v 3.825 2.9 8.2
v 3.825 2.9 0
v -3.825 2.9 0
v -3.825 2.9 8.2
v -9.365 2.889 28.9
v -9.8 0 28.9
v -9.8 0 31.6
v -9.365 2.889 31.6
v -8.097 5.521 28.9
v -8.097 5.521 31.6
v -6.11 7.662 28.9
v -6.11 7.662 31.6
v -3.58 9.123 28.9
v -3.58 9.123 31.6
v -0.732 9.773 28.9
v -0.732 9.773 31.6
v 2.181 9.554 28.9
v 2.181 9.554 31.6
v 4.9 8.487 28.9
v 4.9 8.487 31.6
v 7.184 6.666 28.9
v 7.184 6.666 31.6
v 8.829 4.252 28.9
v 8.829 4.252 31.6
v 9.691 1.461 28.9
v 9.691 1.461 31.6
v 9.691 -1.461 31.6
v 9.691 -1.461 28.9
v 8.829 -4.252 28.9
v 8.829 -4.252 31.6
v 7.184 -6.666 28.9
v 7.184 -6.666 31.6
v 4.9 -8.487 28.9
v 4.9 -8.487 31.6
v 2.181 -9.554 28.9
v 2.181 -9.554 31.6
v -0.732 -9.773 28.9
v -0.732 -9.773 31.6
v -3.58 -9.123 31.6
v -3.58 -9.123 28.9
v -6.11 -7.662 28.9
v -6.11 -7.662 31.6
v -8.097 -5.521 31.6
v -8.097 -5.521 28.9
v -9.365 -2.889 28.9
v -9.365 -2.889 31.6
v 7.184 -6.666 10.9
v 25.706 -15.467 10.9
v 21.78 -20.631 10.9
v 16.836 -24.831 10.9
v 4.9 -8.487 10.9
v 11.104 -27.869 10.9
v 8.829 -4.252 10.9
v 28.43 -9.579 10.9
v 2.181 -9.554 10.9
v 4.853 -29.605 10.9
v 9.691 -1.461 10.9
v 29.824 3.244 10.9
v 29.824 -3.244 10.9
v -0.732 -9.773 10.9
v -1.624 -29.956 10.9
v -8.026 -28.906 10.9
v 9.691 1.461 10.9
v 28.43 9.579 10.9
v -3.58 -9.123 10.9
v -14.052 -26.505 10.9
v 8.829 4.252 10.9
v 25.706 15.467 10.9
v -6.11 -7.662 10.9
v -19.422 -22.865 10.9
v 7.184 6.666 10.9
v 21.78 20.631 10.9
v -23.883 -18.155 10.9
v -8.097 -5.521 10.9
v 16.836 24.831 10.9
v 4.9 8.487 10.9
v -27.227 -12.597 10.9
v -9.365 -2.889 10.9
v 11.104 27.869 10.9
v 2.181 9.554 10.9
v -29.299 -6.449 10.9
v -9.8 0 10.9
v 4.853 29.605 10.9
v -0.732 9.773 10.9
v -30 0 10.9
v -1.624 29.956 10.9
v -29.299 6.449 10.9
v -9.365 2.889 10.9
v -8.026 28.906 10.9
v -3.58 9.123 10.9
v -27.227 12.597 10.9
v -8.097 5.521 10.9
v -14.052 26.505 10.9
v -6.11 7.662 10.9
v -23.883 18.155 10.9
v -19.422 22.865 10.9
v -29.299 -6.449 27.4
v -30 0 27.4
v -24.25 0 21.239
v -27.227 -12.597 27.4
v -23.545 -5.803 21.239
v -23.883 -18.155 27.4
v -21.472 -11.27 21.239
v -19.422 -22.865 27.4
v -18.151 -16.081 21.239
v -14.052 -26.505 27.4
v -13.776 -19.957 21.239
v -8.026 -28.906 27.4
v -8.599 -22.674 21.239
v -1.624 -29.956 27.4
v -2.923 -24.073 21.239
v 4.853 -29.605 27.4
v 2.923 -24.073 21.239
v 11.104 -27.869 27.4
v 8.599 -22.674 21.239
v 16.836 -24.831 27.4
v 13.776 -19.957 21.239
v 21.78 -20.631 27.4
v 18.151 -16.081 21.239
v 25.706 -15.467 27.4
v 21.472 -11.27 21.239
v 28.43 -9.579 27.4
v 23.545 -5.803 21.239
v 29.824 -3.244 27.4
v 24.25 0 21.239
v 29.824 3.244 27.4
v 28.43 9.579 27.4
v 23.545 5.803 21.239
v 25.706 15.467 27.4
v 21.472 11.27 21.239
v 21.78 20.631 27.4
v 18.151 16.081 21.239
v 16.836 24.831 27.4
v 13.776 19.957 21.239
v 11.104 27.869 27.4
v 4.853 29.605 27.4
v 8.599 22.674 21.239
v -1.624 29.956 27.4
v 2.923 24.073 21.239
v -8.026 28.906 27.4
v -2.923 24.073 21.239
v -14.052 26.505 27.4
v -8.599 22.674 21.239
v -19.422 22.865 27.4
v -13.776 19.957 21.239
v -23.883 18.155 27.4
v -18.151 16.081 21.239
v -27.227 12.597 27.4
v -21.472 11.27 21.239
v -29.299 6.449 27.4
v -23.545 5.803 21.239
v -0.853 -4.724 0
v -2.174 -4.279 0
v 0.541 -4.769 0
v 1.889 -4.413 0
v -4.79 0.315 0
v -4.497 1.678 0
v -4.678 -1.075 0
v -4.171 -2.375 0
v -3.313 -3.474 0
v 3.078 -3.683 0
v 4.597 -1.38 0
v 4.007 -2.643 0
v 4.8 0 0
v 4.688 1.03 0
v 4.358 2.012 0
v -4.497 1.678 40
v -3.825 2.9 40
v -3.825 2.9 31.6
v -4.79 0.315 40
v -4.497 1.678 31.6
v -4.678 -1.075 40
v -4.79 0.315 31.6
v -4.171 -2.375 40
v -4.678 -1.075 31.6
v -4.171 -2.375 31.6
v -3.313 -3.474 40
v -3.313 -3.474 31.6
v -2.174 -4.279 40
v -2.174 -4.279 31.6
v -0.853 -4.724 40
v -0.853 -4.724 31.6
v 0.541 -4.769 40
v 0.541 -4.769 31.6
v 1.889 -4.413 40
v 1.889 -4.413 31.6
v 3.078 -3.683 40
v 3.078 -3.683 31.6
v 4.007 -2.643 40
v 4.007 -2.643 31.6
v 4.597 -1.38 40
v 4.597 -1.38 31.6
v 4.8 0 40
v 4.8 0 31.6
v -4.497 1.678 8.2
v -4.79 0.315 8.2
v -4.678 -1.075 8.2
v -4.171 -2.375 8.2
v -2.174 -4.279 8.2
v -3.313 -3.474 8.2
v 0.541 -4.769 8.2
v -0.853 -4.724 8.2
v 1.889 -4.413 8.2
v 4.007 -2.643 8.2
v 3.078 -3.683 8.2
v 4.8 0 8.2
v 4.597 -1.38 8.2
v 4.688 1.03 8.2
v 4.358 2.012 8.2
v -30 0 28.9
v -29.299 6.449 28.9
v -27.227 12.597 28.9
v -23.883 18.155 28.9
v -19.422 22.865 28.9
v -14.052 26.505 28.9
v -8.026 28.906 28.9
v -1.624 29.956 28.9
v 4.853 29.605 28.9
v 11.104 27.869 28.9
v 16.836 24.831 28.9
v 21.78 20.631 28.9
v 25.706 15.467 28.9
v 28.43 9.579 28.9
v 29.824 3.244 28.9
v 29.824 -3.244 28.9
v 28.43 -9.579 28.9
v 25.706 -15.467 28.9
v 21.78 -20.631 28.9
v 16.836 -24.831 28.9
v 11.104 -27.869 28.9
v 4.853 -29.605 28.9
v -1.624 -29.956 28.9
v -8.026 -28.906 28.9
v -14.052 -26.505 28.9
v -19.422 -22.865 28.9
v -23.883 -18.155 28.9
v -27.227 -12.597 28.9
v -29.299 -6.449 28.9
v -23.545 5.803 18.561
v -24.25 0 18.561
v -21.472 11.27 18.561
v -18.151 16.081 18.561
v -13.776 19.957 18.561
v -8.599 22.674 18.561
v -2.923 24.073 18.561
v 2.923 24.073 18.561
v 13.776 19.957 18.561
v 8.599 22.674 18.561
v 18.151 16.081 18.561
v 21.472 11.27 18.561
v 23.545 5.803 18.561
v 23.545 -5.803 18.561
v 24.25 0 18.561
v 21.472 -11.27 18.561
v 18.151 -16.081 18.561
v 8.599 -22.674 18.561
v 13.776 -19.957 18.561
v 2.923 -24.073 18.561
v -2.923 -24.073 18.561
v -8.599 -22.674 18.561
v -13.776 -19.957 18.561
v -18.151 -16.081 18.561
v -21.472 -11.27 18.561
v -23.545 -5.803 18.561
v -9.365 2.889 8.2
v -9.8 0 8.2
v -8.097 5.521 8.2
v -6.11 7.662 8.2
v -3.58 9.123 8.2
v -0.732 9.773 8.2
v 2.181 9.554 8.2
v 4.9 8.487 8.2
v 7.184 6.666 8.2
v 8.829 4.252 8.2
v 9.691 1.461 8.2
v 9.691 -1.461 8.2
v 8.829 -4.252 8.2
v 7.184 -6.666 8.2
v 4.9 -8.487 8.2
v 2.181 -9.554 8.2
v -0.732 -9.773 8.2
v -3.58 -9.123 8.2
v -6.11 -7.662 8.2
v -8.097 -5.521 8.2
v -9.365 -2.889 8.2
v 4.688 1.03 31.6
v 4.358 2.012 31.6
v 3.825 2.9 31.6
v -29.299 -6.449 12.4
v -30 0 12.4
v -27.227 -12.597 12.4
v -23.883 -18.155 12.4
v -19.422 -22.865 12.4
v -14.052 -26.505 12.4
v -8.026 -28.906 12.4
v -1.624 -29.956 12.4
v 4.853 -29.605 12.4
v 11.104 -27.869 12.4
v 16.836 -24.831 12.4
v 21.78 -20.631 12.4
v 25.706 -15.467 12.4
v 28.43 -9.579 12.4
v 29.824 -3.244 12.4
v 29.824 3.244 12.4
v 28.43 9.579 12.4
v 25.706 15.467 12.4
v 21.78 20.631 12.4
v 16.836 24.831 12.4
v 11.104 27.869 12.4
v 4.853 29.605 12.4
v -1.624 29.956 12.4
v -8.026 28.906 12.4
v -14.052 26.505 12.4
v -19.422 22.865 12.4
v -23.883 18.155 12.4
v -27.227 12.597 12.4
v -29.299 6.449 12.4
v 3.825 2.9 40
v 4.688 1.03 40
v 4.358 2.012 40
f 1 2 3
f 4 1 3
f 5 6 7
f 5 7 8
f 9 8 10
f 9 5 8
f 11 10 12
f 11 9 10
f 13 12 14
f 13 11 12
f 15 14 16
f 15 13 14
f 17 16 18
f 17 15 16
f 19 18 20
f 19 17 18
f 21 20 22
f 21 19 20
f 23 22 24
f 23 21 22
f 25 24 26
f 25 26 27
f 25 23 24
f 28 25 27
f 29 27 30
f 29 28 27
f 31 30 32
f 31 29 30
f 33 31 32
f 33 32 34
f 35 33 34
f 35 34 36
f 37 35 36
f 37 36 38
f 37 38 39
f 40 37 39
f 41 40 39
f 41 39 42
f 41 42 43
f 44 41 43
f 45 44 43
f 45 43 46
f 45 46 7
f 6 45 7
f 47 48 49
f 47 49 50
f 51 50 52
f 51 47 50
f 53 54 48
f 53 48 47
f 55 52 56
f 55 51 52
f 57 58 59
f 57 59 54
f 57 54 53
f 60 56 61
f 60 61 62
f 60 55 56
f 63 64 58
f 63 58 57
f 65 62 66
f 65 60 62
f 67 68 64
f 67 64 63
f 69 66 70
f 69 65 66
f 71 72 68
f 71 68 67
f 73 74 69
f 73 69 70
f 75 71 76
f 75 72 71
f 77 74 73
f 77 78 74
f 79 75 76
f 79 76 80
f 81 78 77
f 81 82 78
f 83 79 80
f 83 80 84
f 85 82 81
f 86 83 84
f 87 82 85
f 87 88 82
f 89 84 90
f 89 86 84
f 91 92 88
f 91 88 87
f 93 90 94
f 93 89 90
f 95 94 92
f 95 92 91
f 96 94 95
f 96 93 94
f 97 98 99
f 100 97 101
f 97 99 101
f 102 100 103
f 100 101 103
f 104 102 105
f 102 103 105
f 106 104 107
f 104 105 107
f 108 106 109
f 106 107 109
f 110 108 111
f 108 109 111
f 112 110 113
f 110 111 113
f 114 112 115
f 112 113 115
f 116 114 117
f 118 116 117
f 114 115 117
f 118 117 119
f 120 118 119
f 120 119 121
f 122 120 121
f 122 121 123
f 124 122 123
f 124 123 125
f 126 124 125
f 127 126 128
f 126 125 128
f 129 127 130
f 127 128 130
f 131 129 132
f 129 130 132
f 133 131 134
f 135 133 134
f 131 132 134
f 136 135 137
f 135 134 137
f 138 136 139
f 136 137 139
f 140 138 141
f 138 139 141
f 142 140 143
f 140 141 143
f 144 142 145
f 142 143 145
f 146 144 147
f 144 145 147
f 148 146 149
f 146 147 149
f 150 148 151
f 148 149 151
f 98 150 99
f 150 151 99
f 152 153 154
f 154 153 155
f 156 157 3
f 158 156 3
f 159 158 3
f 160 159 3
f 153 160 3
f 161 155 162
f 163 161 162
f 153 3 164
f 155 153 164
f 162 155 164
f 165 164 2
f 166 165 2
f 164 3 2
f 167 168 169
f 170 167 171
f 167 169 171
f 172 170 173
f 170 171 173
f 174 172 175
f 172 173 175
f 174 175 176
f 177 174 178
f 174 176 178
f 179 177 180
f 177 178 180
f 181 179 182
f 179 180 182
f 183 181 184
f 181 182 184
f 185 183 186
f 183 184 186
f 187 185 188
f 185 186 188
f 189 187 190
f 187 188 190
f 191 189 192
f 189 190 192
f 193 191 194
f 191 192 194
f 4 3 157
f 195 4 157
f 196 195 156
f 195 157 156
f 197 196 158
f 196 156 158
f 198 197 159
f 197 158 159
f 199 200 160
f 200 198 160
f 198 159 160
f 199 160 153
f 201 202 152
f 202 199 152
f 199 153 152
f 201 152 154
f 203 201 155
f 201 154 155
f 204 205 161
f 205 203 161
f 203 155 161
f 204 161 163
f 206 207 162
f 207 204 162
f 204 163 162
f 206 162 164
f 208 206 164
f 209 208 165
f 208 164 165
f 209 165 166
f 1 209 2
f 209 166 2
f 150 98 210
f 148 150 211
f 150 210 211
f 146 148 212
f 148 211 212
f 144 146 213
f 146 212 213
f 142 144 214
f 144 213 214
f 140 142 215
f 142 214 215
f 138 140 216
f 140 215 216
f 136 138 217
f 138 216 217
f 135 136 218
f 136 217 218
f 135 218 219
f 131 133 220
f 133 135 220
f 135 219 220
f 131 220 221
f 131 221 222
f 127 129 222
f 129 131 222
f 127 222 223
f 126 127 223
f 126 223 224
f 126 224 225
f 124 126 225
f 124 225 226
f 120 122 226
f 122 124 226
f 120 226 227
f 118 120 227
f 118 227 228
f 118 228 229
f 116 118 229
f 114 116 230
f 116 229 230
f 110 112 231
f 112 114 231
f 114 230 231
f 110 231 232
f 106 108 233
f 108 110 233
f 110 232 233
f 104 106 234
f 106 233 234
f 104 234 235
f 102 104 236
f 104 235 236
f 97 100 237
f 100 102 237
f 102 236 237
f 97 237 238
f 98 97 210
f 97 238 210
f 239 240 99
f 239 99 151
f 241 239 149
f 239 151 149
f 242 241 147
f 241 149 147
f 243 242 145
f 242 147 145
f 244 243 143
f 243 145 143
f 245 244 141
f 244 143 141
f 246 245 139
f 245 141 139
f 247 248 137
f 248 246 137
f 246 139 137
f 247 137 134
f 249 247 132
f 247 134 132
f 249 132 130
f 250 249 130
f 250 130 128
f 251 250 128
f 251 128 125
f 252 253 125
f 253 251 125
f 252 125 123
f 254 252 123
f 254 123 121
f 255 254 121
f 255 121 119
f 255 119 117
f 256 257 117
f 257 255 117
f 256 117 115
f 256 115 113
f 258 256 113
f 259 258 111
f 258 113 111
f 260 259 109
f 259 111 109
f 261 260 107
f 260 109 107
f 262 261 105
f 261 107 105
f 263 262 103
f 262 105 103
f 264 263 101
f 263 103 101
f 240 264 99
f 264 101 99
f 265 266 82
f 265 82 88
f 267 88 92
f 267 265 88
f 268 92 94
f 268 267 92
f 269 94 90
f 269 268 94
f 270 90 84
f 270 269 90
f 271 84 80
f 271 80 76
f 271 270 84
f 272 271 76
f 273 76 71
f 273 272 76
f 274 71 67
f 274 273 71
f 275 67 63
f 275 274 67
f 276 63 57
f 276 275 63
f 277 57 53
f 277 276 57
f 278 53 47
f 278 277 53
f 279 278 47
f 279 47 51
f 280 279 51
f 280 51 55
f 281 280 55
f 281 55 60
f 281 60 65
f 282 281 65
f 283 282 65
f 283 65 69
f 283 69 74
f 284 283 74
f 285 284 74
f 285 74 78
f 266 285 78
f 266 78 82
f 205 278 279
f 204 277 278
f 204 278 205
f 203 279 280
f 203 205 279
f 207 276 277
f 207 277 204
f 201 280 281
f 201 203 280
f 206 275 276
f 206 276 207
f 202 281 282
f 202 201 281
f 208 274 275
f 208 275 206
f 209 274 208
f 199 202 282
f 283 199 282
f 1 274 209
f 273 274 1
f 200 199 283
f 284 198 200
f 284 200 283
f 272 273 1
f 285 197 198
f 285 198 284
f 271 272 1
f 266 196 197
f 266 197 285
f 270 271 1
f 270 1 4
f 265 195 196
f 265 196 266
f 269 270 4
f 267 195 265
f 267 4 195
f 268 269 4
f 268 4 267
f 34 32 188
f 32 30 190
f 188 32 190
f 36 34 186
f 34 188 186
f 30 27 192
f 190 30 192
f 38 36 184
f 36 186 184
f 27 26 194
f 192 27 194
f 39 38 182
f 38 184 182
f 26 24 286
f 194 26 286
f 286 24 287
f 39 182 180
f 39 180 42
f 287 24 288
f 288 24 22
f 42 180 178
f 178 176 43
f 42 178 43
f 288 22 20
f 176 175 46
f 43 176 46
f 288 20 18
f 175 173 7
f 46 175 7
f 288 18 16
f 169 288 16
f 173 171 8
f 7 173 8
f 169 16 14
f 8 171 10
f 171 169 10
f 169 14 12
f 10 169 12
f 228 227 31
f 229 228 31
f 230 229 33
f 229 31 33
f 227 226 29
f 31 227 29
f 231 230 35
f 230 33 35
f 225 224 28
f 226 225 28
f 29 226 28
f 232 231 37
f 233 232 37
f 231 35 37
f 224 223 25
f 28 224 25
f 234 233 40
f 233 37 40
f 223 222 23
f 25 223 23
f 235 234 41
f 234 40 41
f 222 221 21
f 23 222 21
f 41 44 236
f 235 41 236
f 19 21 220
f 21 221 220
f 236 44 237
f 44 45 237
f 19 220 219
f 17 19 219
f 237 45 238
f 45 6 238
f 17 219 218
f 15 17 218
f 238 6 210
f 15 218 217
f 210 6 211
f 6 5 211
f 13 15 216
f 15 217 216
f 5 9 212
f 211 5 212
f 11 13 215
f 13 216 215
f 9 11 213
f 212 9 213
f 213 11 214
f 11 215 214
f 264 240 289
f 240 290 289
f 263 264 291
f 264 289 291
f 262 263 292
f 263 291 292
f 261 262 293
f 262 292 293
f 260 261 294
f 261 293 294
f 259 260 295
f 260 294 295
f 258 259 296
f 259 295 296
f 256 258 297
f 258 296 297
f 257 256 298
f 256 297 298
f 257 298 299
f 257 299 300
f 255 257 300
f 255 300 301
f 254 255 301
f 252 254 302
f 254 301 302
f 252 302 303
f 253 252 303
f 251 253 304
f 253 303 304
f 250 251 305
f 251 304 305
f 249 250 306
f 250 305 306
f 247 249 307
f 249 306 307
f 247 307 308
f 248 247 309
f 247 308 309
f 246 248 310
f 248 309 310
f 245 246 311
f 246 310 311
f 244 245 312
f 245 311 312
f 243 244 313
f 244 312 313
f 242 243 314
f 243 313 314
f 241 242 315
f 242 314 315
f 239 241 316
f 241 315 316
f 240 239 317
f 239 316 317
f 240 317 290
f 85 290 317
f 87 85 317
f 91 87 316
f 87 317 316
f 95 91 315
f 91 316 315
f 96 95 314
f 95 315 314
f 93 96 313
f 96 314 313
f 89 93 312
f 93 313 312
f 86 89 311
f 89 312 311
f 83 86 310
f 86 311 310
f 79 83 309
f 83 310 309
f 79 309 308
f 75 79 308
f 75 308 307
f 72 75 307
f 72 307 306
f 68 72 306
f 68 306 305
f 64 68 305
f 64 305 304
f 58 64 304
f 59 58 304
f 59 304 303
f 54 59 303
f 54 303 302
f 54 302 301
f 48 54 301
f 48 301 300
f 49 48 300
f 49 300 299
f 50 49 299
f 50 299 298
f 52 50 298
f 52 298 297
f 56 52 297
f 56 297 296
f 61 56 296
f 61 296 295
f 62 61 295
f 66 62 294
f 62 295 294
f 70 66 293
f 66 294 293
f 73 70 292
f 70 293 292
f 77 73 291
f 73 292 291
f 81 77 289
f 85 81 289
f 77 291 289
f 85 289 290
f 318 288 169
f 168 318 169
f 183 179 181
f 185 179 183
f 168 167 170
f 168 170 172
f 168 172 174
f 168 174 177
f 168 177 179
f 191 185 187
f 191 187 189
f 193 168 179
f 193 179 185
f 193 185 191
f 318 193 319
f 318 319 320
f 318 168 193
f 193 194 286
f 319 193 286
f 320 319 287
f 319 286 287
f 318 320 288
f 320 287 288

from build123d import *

# Parameters (mm, degrees)
EXTRUDE_1_DEPTH      = 40
SKETCH_2_R           = 9.8
EXTRUDE_2_DEPTH      = 23.4
EXTRUDE_3_DEPTH      = 9
EXTRUDE_3_DEPTH_BACK = 9
SKETCH_3_R           = 30
EXTRUDE_4_DEPTH      = 2
EXTRUDE_4_DEPTH_BACK = 2
SKETCH_5_R           = 24.25


with BuildPart() as part:
    # 스케치1 → 보스-돌출1 (new body)
    with BuildSketch(Plane.XY):
        with BuildLine():
            Line((3.8249183, 2.9), (-3.8249183, 2.9))
            ThreePointArc((-3.8249183, 2.9), (-1.529769944, -4.549703718), (4.8, 0))
            ThreePointArc((4.8, 0), (4.549703718, 1.529769944), (3.8249183, 2.9))
        make_face()
    extrude(amount=EXTRUDE_1_DEPTH)

    # 스케치2 → 보스-돌출2 (add)
    with BuildSketch(Plane(origin=(0, 0, 8.2), x_dir=(-1, 0, 0), z_dir=(0, 0, -1))):
        Circle(SKETCH_2_R)
    extrude(amount=-EXTRUDE_2_DEPTH)

    # 스케치3 → 보스-돌출3 (add, two sides: drawn at the far end of the back side and taken through both)
    with BuildSketch(Plane(origin=(0, 0, 19.9), x_dir=(-1, 0, 0), z_dir=(0, 0, -1)).offset(-EXTRUDE_3_DEPTH_BACK)):
        Circle(SKETCH_3_R)
    extrude(amount=EXTRUDE_3_DEPTH + EXTRUDE_3_DEPTH_BACK)

    # 스케치4 → 컷-회전1 (revolve, cut)
    with BuildSketch(Plane(origin=(0, 0, 0), x_dir=(0, 0, -1), z_dir=(1, 0, 0)), mode=Mode.PRIVATE) as cut_revolve_1_sk:
        Polygon((-19.9, 23), (-12.4, 30), (-27.4, 30), align=None)
    revolve(cut_revolve_1_sk.sketch.rotate(Axis((0, 0, -4.267978706), (0, 0, 1)), 90), axis=Axis((0, 0, -4.267978706), (0, 0, 1)), mode=Mode.SUBTRACT)

    # 스케치5 → 보스-돌출4 (add, two sides: drawn at the far end of the back side and taken through both)
    with BuildSketch(Plane(origin=(0, 0, 19.9), x_dir=(-1, 0, 0), z_dir=(0, 0, -1)).offset(-EXTRUDE_4_DEPTH_BACK)):
        Circle(SKETCH_5_R)
    extrude(amount=EXTRUDE_4_DEPTH + EXTRUDE_4_DEPTH_BACK)


solid = part.part
